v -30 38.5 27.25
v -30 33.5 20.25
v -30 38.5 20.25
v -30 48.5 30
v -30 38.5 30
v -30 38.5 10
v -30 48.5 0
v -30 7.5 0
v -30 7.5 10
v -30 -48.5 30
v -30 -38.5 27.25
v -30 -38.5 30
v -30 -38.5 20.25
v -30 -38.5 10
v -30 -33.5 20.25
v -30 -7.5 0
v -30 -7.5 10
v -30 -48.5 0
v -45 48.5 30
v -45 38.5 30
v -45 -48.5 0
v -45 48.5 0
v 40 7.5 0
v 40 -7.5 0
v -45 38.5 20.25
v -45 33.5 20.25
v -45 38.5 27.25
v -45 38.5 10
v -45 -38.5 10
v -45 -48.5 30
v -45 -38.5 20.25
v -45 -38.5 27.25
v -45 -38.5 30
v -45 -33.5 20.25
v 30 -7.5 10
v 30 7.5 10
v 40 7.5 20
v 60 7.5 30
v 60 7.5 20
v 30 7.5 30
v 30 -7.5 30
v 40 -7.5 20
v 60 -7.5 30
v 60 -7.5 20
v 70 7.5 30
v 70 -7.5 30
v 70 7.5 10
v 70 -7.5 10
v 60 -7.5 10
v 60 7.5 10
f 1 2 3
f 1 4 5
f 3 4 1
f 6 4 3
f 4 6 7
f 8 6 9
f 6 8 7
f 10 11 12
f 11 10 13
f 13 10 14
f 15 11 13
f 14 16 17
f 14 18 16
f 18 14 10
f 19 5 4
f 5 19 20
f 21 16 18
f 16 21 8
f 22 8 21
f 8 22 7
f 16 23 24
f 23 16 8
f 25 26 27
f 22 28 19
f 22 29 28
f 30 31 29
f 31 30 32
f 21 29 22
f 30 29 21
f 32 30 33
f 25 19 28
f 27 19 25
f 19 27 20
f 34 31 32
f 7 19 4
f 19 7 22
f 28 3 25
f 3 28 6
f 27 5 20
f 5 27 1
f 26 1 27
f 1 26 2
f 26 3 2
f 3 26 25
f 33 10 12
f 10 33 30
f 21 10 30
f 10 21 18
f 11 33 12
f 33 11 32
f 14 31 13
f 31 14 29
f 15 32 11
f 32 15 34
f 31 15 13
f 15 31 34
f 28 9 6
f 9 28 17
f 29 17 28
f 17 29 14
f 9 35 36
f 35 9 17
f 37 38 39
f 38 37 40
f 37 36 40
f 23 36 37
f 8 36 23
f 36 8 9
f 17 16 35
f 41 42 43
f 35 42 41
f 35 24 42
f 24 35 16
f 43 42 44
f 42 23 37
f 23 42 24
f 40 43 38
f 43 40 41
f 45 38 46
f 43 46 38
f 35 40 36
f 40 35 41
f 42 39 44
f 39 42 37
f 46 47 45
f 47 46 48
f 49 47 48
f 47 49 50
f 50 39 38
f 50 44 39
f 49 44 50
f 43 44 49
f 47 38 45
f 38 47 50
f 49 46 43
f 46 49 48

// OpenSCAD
arm_length=60;
arm_width=15;
arm_height=10;

hook_length=20;
hook_depth=10;
clip_depth=10.25;
clip_width=77;
catch_height=7;
catch_length=5;

f=0.001;
fillet=3;

module dup(v) {
    children();
    mirror(v) children();
}

translate([0,0,arm_height/2]) cube([arm_length+f,arm_width,arm_height],center=true);
translate([arm_length/2+arm_height/2,0,hook_depth/2+arm_height]) cube([arm_height,arm_width,arm_height*2+hook_depth,],center=true);
translate([arm_length/2+arm_height+hook_length/2,0,hook_depth+1.5*arm_height]) cube([hook_length+f,arm_width,arm_height],center=true);
translate([arm_length/2+1.5*arm_height+hook_length,0,hook_depth/2+1.5*arm_height]) cube([arm_height,arm_width+f,hook_depth+arm_height],center=true);
translate([-(arm_length+arm_width)/2,0,arm_height/2]) cube([arm_width,clip_width,arm_height],center=true);
dup([0,1,0]) {
    translate([-(arm_length+arm_width)/2,(clip_width+arm_height)/2,hook_depth/2+arm_height]) cube([arm_width,arm_height,hook_depth+arm_height*2],center=true);
    translate([-(arm_width+arm_length)/2,clip_width/2,arm_height+clip_depth]) rotate([90,0,-90]) linear_extrude(arm_width,center=true) polygon(points=[[-f,0],[-f,catch_height],[0,catch_height],[catch_length,0]]);
}
